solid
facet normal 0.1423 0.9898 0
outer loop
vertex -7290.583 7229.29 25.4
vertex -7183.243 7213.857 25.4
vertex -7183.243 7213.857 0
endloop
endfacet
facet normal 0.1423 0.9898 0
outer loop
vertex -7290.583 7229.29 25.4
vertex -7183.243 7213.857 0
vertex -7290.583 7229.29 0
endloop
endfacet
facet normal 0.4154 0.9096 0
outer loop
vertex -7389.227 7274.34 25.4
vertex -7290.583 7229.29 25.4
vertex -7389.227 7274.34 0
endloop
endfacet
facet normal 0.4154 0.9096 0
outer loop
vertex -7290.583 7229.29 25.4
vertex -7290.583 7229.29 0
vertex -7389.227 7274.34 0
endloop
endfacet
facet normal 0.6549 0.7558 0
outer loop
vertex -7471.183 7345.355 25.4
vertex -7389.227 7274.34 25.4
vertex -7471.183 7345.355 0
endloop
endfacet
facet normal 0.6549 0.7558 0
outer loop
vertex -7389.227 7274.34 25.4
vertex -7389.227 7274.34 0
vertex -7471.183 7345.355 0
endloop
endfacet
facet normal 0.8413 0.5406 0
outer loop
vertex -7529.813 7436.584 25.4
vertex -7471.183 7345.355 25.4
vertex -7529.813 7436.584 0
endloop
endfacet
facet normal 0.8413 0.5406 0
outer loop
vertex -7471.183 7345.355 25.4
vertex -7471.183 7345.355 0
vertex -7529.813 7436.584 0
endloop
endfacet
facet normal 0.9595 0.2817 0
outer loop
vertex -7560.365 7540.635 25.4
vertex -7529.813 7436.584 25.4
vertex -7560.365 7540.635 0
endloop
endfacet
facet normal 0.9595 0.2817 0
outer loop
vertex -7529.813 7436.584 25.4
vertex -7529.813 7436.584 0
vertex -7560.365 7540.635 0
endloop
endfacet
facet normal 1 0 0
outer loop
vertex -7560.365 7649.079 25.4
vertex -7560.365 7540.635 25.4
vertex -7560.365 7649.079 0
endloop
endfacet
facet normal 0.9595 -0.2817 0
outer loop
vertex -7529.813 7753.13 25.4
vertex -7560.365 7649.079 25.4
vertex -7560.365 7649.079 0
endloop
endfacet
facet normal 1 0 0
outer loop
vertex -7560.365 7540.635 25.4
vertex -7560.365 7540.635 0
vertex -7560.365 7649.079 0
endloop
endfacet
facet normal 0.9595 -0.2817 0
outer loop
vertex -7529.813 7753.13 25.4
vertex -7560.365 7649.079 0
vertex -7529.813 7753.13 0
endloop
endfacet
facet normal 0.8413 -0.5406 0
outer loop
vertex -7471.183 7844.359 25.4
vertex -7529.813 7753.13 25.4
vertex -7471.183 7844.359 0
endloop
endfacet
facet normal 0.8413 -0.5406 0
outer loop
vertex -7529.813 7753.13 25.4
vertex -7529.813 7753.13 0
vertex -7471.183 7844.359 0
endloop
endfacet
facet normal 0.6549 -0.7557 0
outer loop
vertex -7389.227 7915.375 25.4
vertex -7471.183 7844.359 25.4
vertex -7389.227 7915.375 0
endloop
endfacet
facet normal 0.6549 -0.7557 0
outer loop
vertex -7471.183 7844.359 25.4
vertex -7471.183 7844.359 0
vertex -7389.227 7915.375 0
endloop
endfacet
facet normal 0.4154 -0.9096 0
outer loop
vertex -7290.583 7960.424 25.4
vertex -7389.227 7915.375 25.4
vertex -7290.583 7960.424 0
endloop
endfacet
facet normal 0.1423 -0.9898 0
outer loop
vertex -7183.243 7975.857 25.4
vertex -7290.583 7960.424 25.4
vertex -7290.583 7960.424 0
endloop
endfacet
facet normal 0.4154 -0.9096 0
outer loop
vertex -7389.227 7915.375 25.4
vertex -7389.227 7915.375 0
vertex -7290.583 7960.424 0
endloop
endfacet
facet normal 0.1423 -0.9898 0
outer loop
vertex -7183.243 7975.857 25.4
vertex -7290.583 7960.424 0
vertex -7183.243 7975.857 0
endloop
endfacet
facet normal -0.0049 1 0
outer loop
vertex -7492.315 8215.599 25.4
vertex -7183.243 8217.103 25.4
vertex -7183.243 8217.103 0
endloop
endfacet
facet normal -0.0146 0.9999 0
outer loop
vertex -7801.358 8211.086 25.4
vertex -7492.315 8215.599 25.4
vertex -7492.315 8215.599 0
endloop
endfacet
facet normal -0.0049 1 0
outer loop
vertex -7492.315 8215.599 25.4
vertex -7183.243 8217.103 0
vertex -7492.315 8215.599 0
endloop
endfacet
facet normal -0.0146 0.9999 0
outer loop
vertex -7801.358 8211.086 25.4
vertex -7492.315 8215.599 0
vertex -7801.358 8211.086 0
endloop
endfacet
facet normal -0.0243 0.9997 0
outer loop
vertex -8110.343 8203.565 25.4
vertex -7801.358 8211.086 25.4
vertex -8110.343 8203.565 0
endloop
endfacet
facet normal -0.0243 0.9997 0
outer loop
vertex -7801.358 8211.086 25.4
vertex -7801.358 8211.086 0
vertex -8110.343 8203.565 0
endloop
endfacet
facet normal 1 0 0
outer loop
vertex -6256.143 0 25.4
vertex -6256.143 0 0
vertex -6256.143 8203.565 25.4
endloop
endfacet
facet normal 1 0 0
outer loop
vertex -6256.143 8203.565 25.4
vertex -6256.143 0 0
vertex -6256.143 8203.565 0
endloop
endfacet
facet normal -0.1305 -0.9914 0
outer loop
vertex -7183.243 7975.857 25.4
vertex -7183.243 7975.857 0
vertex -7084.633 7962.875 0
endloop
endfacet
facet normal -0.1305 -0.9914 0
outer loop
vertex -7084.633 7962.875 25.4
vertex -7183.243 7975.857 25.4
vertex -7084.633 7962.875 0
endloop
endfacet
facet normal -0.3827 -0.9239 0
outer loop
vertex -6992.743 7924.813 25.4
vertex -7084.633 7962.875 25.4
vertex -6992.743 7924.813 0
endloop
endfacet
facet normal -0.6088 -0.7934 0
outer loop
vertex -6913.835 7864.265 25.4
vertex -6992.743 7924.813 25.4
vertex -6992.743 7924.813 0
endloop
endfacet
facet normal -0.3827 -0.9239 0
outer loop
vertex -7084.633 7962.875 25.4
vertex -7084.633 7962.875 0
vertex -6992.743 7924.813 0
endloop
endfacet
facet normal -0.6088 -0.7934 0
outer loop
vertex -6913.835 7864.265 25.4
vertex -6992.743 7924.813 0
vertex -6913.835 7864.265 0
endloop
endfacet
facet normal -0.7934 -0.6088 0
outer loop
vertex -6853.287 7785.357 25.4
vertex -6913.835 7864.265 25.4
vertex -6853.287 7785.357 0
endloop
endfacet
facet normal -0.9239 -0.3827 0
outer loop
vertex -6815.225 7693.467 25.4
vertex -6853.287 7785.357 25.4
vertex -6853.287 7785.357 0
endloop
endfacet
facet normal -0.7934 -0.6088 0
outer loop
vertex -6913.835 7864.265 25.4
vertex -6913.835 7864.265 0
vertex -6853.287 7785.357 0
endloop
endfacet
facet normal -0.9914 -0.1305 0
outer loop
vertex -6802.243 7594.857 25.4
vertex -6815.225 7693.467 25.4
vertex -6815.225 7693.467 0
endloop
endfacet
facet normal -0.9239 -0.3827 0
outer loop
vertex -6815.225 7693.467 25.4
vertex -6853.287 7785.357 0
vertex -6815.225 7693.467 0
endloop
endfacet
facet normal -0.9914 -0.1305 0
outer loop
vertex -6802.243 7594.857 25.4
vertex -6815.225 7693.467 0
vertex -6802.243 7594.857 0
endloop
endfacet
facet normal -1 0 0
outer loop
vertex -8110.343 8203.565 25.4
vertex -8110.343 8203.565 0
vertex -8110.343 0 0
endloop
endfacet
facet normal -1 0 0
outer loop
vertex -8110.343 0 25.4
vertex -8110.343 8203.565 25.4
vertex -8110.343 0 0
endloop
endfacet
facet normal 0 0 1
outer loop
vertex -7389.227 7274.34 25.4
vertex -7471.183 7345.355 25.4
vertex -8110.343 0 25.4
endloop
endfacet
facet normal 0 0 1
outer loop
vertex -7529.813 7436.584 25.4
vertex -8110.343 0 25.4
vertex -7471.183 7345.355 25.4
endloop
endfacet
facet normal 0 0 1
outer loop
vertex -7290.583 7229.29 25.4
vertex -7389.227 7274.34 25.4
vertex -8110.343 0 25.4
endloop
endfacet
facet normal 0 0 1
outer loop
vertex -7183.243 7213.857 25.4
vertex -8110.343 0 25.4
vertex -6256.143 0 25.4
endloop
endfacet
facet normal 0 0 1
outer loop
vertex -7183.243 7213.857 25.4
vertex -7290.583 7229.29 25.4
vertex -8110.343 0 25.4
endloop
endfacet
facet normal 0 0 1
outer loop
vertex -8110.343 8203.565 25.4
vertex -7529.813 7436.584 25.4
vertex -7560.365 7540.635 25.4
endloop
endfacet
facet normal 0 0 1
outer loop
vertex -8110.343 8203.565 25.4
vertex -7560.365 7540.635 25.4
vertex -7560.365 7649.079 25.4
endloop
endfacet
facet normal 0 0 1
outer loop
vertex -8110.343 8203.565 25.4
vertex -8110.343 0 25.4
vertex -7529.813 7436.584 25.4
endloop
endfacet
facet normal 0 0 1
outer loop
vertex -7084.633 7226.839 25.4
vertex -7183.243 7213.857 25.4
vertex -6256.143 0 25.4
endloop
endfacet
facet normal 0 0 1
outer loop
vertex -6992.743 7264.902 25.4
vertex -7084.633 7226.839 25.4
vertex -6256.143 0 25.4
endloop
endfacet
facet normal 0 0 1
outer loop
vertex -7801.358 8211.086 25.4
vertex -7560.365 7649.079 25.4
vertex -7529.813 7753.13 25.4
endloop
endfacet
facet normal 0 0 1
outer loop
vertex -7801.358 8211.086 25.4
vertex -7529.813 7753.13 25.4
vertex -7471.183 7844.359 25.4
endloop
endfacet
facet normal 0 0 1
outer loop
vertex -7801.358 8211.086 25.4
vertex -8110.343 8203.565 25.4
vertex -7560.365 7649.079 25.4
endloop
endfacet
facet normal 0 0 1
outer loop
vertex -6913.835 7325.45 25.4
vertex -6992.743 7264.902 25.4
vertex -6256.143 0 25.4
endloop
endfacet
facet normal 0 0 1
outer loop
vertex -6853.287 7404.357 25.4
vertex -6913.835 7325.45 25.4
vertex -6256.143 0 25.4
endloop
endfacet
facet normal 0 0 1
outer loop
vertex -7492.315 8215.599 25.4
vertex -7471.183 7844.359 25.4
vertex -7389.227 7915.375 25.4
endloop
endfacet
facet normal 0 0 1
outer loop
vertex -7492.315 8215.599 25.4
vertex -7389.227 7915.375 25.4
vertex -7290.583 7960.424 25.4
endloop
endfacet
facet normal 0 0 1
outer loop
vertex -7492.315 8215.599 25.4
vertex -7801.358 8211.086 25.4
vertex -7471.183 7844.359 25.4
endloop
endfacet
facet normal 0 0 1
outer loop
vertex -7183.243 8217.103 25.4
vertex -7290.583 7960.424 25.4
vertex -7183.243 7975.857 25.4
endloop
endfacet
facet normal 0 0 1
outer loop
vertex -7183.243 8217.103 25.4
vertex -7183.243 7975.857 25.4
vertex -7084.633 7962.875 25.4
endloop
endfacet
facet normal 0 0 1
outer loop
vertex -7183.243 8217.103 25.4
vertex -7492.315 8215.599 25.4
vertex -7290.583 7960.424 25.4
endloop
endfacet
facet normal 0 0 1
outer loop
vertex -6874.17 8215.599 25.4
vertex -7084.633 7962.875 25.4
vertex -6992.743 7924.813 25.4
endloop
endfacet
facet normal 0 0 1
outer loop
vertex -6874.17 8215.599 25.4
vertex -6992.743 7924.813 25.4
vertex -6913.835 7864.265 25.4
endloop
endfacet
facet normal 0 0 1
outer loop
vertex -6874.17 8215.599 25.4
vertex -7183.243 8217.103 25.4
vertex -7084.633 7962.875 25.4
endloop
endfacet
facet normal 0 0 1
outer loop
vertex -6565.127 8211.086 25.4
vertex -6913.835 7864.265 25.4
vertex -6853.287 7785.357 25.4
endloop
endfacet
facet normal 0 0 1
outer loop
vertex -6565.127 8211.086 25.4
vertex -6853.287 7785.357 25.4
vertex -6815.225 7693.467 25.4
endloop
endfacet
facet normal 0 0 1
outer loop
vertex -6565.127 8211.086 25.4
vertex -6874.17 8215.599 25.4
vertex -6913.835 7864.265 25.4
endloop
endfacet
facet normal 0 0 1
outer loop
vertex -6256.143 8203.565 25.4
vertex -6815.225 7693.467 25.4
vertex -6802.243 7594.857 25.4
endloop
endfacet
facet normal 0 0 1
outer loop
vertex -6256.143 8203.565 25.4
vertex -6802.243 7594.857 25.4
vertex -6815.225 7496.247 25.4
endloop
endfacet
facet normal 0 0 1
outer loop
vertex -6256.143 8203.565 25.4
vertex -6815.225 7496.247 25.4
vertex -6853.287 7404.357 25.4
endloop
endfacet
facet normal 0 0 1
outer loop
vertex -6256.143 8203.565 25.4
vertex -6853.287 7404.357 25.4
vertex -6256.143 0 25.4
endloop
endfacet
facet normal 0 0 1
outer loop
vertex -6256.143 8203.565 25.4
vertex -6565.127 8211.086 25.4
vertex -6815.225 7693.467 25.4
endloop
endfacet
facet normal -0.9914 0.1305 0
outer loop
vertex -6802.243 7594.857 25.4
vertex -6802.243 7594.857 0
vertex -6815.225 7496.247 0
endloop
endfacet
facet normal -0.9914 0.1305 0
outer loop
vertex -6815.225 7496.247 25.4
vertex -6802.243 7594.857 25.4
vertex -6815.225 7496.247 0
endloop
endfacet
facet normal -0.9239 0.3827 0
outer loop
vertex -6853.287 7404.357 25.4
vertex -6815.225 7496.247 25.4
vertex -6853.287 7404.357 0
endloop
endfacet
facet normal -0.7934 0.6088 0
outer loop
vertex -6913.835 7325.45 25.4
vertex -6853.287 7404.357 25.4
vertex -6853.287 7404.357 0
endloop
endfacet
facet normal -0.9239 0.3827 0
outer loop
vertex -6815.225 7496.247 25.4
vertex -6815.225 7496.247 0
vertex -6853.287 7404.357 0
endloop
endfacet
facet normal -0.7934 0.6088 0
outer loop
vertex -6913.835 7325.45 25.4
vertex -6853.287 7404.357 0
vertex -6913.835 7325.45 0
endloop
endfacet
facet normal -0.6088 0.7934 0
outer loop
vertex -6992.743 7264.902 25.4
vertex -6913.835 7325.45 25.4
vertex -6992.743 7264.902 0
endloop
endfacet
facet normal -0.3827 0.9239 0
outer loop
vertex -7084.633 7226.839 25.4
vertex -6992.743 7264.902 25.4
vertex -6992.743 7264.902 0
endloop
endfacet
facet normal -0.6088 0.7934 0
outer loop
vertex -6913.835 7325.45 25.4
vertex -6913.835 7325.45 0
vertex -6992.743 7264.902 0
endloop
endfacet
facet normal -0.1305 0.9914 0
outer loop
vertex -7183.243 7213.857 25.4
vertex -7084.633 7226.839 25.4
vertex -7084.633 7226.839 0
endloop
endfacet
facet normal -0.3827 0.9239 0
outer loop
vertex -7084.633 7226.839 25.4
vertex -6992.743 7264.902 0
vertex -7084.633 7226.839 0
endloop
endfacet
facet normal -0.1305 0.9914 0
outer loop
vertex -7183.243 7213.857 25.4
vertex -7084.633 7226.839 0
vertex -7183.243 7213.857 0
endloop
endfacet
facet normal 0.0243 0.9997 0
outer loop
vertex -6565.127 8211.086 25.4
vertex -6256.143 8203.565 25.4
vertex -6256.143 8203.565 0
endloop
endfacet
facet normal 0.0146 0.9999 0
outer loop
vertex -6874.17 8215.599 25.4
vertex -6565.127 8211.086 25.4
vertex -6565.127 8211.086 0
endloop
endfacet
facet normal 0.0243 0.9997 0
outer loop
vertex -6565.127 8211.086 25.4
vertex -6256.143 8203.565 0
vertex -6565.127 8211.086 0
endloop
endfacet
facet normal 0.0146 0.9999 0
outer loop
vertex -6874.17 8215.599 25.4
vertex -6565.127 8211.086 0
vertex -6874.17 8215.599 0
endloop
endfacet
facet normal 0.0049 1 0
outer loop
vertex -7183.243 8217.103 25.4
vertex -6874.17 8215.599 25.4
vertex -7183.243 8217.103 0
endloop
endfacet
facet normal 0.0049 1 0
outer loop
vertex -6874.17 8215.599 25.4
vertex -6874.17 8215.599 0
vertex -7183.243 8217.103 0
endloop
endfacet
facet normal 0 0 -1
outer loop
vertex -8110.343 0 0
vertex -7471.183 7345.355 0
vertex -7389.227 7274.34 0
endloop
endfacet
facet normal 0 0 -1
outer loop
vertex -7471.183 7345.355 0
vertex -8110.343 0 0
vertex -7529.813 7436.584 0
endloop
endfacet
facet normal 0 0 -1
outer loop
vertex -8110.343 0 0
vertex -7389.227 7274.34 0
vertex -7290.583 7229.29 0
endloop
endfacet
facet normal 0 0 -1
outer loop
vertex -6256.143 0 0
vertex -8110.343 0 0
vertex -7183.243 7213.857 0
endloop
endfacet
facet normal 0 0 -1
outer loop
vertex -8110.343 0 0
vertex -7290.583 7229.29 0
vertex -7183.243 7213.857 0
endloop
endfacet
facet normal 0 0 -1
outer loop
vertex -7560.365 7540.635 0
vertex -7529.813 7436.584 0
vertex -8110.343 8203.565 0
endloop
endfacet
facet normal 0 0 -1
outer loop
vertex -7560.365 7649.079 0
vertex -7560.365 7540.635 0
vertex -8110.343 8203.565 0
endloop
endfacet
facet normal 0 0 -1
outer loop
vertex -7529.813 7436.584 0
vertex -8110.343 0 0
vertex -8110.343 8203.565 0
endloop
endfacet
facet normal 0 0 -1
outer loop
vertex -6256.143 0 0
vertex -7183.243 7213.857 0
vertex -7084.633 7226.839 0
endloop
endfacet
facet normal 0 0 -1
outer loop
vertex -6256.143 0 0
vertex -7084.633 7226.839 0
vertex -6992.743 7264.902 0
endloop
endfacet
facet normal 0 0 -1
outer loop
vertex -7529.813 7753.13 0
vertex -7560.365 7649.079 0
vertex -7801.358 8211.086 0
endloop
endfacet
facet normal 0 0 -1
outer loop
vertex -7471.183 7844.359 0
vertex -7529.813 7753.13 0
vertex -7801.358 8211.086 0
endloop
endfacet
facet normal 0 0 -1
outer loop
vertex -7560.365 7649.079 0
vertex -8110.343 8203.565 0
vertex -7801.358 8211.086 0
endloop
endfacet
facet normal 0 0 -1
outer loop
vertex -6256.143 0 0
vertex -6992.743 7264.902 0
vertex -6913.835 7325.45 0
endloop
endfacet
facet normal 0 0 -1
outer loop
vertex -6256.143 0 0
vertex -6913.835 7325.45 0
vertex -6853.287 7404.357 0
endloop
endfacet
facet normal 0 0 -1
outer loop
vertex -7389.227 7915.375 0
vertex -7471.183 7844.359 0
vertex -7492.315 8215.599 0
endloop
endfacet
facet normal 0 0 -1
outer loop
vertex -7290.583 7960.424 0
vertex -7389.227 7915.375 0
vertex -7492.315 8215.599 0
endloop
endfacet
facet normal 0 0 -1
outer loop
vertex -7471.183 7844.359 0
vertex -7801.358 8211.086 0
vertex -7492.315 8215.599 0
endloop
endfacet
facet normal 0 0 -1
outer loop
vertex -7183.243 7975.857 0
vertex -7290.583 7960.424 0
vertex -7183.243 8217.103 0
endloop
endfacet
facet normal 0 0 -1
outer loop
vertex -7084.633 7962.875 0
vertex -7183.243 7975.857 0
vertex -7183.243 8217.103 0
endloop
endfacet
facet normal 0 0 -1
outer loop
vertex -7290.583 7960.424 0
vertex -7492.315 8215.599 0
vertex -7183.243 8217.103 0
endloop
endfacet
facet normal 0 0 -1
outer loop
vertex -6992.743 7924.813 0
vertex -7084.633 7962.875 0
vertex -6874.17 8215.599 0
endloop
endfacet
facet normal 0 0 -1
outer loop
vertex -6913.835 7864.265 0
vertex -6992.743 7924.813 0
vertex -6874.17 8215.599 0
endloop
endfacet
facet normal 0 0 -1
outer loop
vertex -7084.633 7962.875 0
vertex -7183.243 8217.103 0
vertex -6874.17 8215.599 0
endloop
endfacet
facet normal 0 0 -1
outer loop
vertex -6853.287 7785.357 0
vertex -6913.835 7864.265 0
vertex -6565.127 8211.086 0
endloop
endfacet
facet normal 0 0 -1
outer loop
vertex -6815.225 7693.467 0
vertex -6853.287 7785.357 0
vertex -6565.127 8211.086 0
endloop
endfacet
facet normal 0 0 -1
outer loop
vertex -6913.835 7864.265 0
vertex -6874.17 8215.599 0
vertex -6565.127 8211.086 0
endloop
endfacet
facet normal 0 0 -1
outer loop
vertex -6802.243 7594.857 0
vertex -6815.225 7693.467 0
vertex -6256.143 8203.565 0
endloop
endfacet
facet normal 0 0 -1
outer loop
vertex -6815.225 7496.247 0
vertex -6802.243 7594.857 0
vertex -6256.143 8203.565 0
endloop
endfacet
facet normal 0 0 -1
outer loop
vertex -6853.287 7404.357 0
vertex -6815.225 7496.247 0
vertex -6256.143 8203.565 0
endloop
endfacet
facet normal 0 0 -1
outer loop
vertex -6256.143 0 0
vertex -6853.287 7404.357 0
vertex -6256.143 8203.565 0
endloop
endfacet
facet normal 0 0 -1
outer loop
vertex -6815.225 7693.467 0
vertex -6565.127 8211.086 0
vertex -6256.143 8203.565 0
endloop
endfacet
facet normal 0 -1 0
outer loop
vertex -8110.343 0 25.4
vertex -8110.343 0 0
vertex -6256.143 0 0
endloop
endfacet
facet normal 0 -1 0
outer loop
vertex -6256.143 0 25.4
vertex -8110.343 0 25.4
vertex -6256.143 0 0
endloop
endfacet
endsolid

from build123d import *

# Parameters (mm, degrees)
F1_DEPTH = 25.4


with BuildPart() as f1:
    # F0 (on Top) → F1 (new body)
    with BuildSketch(Plane.XY):
        with BuildLine():
            Line((-8110.342875, 8203.565), (-8110.342875, 0))
            Line((-8110.342875, 0), (-7183.242875, 0))
            Line((-7183.242875, 0), (-7183.242875, 7213.857216))
            ThreePointArc((-7183.242875, 7213.857216), (-7564.242875, 7594.857216), (-7183.242875, 7975.857216))
            Line((-7183.242875, 7975.857216), (-7183.242875, 8217.1032))
            ThreePointArc((-7183.242875, 8217.1032), (-7646.842296, 8213.71847), (-8110.342875, 8203.565))
        make_face()
        with BuildLine():
            Line((-7183.242875, 7213.857216), (-7183.242875, 0))
            Line((-7183.242875, 0), (-6256.142875, 0))
            Line((-6256.142875, 0), (-6256.142875, 8203.565))
            ThreePointArc((-6256.142875, 8203.565), (-6719.643454, 8213.71847), (-7183.242875, 8217.1032))
            Line((-7183.242875, 8217.1032), (-7183.242875, 7975.857216))
            ThreePointArc((-7183.242875, 7975.857216), (-6913.835192, 7864.2649), (-6802.242875, 7594.857216))
            ThreePointArc((-6802.242875, 7594.857216), (-6913.835192, 7325.449532), (-7183.242875, 7213.857216))
        make_face()
    extrude(amount=F1_DEPTH)


solid = f1.part
